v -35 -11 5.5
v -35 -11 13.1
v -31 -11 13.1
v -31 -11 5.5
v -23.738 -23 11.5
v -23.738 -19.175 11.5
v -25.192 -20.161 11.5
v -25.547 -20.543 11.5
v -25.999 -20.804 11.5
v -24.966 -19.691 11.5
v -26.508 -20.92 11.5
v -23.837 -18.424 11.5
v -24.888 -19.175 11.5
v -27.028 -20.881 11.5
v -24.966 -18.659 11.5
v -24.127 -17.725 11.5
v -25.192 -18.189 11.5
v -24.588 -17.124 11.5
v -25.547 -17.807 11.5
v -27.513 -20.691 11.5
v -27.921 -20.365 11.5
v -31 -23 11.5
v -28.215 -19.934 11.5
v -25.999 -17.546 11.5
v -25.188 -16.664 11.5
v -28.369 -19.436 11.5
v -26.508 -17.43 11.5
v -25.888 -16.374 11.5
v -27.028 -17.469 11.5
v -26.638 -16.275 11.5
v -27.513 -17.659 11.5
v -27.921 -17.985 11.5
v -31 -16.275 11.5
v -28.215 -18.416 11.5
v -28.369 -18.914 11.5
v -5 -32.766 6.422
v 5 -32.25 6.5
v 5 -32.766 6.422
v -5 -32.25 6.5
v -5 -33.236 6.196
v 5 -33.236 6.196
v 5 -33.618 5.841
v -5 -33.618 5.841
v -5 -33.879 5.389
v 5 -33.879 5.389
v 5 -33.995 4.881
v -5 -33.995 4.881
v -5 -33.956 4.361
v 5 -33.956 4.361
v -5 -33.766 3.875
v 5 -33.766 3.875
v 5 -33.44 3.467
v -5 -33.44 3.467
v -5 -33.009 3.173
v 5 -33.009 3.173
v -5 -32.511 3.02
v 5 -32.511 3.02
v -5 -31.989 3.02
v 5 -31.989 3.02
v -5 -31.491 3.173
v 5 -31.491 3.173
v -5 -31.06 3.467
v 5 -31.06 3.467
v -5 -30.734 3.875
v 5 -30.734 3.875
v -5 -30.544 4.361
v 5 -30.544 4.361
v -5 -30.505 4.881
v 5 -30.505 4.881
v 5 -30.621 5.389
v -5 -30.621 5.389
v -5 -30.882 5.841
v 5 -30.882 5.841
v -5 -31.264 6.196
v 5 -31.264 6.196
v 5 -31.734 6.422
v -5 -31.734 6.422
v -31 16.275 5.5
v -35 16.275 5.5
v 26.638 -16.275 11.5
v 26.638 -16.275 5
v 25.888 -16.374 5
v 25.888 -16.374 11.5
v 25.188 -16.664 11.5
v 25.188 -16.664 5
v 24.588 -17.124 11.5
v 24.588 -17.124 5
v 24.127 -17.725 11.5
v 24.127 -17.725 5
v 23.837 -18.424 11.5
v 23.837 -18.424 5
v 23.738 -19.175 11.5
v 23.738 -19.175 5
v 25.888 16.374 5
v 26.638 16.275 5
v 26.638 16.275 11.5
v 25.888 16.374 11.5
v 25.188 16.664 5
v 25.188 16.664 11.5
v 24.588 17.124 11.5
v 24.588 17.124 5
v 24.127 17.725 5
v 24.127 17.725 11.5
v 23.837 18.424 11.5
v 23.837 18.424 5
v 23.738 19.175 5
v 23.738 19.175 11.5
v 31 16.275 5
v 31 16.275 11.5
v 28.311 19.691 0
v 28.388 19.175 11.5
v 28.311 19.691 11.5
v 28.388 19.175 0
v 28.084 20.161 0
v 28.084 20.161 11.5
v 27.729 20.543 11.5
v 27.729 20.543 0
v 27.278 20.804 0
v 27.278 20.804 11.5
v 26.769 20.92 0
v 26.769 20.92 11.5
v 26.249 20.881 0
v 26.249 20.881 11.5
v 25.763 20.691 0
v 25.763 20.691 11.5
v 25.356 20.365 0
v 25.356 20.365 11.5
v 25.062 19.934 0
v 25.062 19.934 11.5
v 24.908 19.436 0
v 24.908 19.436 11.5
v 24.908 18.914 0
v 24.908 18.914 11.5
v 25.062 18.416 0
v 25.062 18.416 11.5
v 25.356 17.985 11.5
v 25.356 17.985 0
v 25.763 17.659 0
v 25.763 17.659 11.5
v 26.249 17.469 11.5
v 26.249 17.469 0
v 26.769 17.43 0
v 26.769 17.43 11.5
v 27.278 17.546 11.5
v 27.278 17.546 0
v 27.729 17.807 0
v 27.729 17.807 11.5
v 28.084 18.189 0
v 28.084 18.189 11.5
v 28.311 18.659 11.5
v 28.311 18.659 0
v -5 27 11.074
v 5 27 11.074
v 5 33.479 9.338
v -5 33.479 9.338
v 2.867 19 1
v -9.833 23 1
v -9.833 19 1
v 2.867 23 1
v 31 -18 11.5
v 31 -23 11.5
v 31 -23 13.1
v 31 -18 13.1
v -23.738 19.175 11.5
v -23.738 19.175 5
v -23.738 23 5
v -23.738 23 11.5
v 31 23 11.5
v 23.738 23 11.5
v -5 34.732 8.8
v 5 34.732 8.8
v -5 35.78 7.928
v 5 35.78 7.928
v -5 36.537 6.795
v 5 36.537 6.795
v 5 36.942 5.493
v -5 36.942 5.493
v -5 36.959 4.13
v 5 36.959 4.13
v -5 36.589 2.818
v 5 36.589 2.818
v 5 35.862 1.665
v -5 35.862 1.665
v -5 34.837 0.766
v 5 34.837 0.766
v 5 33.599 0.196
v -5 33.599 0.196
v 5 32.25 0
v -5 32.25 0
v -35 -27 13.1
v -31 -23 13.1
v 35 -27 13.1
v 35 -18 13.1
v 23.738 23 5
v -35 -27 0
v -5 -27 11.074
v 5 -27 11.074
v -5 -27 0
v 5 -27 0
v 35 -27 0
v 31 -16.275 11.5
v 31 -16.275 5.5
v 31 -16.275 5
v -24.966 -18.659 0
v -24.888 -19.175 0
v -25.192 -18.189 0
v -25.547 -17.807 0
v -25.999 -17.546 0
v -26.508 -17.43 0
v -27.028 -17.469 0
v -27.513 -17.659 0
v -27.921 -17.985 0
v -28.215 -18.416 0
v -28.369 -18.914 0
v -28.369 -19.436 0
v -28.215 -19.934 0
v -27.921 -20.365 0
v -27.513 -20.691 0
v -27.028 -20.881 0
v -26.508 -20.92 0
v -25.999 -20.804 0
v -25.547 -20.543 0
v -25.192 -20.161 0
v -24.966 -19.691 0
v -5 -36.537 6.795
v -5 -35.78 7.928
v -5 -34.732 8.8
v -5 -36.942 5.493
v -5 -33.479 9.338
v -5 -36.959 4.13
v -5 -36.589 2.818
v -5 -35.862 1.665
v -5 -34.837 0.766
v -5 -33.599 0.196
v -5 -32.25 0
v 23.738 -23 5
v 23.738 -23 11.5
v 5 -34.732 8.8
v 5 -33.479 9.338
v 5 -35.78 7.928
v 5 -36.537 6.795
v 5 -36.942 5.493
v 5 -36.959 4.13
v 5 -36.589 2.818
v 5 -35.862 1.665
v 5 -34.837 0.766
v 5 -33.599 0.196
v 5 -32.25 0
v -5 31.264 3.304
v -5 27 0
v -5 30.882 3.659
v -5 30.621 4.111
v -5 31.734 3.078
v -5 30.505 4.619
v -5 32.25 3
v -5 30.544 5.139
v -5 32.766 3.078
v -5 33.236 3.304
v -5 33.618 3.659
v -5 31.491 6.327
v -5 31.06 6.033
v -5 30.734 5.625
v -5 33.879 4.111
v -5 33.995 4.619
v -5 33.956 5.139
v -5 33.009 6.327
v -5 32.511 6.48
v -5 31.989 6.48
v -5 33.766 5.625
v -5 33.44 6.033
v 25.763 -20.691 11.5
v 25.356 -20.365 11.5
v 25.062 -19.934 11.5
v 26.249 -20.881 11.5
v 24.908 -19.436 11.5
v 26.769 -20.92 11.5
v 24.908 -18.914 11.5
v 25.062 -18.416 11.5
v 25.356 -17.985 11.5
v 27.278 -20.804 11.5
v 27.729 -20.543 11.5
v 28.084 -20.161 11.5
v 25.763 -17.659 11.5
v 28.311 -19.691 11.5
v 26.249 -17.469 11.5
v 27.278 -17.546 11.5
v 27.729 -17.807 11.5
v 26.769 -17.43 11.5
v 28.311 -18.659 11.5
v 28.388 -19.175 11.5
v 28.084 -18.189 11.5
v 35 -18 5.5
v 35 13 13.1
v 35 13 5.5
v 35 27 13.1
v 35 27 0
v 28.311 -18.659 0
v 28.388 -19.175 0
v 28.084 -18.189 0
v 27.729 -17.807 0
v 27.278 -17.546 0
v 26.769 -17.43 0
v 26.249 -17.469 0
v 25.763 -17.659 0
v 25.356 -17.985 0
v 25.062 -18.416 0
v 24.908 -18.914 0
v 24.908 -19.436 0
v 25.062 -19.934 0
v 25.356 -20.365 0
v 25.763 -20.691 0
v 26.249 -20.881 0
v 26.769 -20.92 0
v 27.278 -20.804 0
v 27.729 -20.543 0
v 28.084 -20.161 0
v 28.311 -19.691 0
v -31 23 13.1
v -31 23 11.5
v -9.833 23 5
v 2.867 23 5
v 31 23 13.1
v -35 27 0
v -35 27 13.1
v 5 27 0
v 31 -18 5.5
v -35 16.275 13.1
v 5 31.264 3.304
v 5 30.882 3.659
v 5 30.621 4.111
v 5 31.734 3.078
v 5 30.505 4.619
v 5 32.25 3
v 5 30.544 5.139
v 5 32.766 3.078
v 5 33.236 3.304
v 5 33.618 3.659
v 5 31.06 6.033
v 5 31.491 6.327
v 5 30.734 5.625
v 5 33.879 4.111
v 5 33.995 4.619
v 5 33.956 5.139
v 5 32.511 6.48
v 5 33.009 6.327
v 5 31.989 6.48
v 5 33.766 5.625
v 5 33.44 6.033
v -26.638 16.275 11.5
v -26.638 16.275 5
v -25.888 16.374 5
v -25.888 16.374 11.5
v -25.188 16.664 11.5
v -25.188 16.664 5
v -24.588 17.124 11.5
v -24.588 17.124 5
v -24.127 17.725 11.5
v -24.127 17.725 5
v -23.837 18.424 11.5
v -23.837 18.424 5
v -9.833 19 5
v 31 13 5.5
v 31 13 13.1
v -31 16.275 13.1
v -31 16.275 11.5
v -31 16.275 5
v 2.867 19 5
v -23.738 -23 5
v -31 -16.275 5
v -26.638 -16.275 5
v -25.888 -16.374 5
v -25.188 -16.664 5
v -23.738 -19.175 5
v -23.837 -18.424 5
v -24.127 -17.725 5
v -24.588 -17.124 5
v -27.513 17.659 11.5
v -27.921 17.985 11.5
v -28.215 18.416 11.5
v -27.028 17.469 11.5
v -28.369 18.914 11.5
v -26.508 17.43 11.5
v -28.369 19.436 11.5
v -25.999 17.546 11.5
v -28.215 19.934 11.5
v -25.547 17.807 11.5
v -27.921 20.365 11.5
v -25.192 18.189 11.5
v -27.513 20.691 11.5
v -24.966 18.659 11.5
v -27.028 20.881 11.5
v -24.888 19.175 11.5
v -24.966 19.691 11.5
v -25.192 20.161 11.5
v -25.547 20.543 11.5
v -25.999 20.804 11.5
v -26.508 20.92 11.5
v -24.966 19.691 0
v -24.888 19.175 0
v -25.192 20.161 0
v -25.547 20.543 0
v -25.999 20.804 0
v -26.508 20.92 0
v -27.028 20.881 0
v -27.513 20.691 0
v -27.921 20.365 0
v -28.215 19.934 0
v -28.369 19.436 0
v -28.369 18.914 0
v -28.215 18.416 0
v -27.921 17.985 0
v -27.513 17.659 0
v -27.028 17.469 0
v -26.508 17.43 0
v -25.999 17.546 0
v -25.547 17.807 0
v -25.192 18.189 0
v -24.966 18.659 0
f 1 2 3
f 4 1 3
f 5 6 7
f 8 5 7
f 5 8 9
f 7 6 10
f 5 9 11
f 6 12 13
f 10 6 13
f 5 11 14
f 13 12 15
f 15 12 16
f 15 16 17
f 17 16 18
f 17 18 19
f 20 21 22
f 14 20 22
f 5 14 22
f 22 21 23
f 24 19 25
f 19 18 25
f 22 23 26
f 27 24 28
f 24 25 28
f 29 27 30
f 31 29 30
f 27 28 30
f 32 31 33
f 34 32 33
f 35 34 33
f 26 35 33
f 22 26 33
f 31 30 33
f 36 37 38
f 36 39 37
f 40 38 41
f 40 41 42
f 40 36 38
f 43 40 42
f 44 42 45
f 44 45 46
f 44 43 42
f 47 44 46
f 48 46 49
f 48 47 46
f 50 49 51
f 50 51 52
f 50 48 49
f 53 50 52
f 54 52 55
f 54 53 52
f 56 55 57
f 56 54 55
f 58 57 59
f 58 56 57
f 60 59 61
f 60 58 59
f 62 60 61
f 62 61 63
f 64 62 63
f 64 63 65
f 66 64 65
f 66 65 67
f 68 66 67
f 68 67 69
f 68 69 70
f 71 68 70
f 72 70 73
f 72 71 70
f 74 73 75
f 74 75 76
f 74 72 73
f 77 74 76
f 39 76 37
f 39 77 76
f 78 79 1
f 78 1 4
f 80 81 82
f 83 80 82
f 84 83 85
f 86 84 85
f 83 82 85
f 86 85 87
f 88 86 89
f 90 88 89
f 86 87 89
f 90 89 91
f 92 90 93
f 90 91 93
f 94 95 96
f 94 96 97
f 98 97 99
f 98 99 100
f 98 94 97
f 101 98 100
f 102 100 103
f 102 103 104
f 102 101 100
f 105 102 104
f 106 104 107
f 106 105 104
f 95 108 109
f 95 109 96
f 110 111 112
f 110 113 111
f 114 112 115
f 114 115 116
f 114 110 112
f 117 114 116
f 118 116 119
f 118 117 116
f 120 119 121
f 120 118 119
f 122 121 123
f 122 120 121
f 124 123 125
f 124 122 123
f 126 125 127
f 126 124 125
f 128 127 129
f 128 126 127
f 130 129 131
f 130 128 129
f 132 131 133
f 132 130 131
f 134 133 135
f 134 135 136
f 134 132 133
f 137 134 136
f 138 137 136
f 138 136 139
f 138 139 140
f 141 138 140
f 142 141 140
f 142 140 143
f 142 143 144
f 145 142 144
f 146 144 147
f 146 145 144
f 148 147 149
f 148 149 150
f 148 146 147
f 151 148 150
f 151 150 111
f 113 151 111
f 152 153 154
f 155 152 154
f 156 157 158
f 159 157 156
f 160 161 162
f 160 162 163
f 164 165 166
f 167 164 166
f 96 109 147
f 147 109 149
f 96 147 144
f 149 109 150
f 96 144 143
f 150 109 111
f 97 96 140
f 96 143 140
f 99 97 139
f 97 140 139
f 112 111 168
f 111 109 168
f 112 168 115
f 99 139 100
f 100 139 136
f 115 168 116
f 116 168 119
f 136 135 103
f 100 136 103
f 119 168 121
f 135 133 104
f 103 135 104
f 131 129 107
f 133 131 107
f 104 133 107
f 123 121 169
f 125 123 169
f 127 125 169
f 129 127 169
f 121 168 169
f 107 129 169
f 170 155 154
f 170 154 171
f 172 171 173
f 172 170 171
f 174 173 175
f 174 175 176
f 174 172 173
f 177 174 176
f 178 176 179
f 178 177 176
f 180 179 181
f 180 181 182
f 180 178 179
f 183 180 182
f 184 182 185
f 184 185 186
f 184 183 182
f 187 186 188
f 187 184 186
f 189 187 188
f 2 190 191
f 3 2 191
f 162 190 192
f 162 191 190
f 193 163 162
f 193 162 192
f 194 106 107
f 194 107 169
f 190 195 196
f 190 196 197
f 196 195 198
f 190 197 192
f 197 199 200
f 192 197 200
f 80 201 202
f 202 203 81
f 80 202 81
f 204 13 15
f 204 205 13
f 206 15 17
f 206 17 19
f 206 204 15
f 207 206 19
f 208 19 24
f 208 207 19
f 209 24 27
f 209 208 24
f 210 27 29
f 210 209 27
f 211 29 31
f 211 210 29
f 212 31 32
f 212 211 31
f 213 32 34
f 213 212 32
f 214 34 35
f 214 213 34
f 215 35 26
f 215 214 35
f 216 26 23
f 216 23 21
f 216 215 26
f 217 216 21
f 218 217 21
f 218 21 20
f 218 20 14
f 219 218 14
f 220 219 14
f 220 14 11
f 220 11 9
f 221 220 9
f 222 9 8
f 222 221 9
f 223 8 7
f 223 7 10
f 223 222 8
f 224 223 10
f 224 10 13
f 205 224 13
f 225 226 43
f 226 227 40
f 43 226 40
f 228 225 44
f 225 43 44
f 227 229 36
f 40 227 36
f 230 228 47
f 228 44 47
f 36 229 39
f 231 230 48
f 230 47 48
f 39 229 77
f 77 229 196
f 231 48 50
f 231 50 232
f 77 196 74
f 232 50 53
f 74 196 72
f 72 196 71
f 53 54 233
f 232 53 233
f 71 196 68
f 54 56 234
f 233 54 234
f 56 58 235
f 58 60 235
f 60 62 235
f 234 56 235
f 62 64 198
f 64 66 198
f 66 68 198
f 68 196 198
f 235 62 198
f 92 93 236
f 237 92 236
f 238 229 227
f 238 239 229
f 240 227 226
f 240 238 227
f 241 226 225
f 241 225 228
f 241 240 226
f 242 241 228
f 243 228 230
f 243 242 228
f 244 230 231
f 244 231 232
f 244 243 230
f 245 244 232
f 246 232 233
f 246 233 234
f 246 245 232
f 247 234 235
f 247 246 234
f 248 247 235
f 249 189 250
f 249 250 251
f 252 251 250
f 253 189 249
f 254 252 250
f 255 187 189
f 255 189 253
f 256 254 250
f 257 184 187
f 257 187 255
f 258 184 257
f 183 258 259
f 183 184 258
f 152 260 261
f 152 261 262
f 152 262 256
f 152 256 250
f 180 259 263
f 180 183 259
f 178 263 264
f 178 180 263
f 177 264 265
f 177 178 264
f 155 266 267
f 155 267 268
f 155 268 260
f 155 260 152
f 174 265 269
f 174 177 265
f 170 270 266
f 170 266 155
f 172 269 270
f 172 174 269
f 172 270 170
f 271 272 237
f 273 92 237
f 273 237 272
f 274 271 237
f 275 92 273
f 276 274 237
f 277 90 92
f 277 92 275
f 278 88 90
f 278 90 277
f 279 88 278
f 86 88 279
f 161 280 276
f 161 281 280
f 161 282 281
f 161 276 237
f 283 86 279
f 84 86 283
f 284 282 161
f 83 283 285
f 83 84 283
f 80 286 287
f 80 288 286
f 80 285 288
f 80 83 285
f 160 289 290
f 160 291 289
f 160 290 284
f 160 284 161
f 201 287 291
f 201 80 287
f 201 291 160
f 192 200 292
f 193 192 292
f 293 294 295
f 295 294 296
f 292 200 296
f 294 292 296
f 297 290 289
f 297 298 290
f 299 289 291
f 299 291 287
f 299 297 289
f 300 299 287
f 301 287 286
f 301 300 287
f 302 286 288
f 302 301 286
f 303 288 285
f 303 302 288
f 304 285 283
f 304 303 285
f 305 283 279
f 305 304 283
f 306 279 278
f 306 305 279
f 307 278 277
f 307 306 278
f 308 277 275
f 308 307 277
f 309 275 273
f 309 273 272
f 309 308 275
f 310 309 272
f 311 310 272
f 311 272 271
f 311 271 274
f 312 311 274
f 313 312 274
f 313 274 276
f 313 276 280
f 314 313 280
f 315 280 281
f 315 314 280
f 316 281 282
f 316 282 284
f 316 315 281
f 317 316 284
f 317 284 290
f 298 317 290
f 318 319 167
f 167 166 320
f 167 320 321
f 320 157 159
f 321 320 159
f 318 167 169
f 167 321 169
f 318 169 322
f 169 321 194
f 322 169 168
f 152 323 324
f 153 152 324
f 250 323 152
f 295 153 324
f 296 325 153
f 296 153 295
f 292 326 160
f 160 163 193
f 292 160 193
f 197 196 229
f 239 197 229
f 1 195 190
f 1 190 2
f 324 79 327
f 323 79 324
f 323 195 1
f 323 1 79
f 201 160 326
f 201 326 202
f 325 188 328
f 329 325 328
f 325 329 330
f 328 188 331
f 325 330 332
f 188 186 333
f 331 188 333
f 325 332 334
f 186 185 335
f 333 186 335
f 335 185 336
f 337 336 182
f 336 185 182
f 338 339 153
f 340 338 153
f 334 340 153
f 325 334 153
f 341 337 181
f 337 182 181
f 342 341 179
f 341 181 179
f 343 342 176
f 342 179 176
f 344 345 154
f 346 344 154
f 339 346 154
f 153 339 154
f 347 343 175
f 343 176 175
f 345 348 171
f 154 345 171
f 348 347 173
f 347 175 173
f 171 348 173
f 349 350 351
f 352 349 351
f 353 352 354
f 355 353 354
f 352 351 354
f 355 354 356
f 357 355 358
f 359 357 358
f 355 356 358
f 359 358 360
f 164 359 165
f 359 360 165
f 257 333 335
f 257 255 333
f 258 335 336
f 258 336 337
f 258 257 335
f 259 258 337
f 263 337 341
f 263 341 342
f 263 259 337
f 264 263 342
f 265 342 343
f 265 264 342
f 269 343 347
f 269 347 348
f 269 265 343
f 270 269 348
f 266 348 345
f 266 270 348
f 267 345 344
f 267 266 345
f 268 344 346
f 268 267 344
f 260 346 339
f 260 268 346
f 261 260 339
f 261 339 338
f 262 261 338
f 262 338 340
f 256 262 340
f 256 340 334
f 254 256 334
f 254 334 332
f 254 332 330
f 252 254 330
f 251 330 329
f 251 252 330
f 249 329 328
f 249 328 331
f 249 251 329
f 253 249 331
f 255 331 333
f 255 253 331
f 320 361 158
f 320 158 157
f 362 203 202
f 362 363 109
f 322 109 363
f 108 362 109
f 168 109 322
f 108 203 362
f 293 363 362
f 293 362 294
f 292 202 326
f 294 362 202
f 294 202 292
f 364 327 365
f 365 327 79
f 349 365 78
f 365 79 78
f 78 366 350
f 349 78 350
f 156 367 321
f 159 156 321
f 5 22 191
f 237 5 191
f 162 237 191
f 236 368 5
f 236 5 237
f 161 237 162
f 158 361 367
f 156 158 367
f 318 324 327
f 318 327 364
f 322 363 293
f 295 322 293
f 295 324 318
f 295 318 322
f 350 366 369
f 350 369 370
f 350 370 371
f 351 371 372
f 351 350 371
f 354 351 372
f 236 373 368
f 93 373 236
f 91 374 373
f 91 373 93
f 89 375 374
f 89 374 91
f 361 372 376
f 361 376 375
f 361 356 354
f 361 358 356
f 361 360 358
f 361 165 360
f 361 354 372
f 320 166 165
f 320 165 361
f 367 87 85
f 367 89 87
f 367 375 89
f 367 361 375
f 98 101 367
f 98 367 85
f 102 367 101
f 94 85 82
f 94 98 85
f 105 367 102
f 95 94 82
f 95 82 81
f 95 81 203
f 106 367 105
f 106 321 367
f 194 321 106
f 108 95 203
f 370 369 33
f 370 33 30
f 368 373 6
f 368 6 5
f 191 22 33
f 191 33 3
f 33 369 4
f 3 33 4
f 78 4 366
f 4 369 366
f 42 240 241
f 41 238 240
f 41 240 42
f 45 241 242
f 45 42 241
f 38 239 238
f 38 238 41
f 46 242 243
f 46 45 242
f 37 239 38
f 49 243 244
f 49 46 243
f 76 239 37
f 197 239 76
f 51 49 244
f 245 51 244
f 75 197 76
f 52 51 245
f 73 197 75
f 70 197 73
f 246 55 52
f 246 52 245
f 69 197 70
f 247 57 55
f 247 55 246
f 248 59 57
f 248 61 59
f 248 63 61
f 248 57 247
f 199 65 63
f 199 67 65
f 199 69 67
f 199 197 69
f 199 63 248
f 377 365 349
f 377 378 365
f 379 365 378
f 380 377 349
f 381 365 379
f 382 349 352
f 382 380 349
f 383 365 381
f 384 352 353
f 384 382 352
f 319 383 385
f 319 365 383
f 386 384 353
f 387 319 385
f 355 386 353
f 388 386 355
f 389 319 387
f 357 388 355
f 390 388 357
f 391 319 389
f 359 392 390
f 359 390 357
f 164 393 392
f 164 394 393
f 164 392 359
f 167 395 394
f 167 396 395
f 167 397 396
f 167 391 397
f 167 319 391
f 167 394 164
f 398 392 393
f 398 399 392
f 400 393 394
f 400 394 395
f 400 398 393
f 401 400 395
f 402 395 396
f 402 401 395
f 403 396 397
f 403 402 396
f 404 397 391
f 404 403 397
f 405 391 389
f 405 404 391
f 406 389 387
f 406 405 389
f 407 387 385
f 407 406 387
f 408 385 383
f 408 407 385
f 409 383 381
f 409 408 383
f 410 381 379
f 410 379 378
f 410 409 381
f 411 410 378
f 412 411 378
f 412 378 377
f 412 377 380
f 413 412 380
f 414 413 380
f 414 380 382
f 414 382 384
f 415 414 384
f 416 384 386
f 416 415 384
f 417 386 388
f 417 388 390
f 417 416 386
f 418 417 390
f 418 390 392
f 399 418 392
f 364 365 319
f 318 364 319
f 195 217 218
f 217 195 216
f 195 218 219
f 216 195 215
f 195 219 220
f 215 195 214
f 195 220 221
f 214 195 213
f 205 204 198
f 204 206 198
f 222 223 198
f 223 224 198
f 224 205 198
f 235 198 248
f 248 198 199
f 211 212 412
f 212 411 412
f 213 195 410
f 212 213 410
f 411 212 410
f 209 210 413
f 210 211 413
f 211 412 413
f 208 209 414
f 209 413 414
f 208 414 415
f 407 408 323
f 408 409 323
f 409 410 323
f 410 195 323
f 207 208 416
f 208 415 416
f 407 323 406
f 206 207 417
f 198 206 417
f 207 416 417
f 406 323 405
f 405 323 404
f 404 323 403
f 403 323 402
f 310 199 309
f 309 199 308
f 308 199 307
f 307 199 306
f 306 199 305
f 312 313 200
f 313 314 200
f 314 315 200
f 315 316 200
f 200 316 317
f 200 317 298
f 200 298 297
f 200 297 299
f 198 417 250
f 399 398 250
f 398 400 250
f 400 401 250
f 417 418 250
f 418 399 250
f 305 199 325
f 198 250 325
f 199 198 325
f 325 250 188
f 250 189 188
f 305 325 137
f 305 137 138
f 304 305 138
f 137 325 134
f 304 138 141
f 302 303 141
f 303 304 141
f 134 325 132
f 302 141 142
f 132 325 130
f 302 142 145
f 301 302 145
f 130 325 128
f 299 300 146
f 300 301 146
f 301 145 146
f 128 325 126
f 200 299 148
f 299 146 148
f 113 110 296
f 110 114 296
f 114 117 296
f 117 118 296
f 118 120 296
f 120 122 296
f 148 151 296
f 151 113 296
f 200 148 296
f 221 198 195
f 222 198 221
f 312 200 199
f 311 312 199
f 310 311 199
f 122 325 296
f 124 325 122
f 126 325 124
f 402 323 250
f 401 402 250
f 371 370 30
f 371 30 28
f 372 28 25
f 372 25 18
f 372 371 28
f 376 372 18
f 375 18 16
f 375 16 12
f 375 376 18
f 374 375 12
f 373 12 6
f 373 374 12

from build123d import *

# Parameters (mm, degrees)
SKETCH1_W           = 62
SKETCH1_H           = 46
SKETCH1_R           = 1.75
BOSS_EXTRUDE1_DEPTH = 5
SKETCH1_3_W         = 70
SKETCH1_3_H         = 54
SKETCH1_3_W_2       = 62
SKETCH1_3_H_2       = 46
BOSS_EXTRUDE2_DEPTH = 13.1
SKETCH2_W           = 12.7
SKETCH2_H           = 4
CUT_EXTRUDE1_DEPTH  = 4
SKETCH3_R           = 1.75
BOSS_EXTRUDE3_DEPTH = 6.5
SKETCH4_W           = 4
SKETCH4_H           = 27.275016295
SKETCH4_H_2         = 31
CUT_EXTRUDE2_DEPTH  = 7.6
SKETCH5_R           = 1.75
BOSS_EXTRUDE4_DEPTH = 5


with BuildPart() as part:
    # Sketch1 → Boss-Extrude1 (new body)
    with BuildSketch(Plane.XY):
        Rectangle(SKETCH1_W, SKETCH1_H)
        with Locations((26.638347595, -19.175016295)):
            Circle(SKETCH1_R, mode=Mode.SUBTRACT)
        with Locations((26.638347595, 19.175016295)):
            Circle(SKETCH1_R, mode=Mode.SUBTRACT)
        with Locations((-26.638347595, 19.175016295)):
            Circle(SKETCH1_R, mode=Mode.SUBTRACT)
        with Locations((-26.638347595, -19.175016295)):
            Circle(SKETCH1_R, mode=Mode.SUBTRACT)
    extrude(amount=BOSS_EXTRUDE1_DEPTH)

    # Sketch1<3> → Boss-Extrude2 (add)
    with BuildSketch(Plane.XY):
        Rectangle(SKETCH1_3_W, SKETCH1_3_H)
        Rectangle(SKETCH1_3_W_2, SKETCH1_3_H_2, mode=Mode.SUBTRACT)
    extrude(amount=BOSS_EXTRUDE2_DEPTH)

    # Sketch2 → Cut-Extrude1 (cut)
    with BuildSketch(Plane.XY.offset(5)):
        with Locations((-3.48328221, 21)):
            Rectangle(SKETCH2_W, SKETCH2_H)
    extrude(amount=-CUT_EXTRUDE1_DEPTH, mode=Mode.SUBTRACT)

    # Sketch3 → Boss-Extrude3 (add)
    # profile 1 of 4: a face of its own
    with BuildSketch(Plane.XY.offset(5)):
        with BuildLine():
            Line((-23.738347595, 19.175016295), (-23.738347595, 23))
            Line((-23.738347595, 23), (-31, 23))
            Line((-31, 23), (-31, 16.275016295))
            Line((-31, 16.275016295), (-26.638347595, 16.275016295))
            ThreePointArc((-26.638347595, 16.275016295), (-24.58773793, 17.12440663), (-23.738347595, 19.175016295))
        make_face()
        with Locations((-26.638347595, 19.175016295)):
            Circle(SKETCH3_R, mode=Mode.SUBTRACT)
    # profile 2 of 4: a face of its own
    with BuildSketch(Plane.XY.offset(5)):
        with BuildLine():
            Line((-31, -16.275016295), (-26.638347595, -16.275016295))
            ThreePointArc((-26.638347595, -16.275016295), (-24.58773793, -17.12440663), (-23.738347595, -19.175016295))
            Line((-23.738347595, -19.175016295), (-23.738347595, -23))
            Line((-23.738347595, -23), (-31, -23))
            Line((-31, -23), (-31, -16.275016295))
        make_face()
        with Locations((-26.638347595, -19.175016295)):
            Circle(SKETCH3_R, mode=Mode.SUBTRACT)
    # profile 3 of 4: a face of its own
    with BuildSketch(Plane.XY.offset(5)):
        with BuildLine():
            Line((31, -23), (31, -16.275016295))
            Line((31, -16.275016295), (26.638347595, -16.275016295))
            ThreePointArc((26.638347595, -16.275016295), (24.58773793, -17.12440663), (23.738347595, -19.175016295))
            Line((23.738347595, -19.175016295), (23.738347595, -23))
            Line((23.738347595, -23), (31, -23))
        make_face()
        with Locations((26.638347595, -19.175016295)):
            Circle(SKETCH3_R, mode=Mode.SUBTRACT)
    # profile 4 of 4: a face of its own
    with BuildSketch(Plane.XY.offset(5)):
        with BuildLine():
            Line((31, 16.275016295), (26.638347595, 16.275016295))
            ThreePointArc((26.638347595, 16.275016295), (24.58773793, 17.12440663), (23.738347595, 19.175016295))
            Line((23.738347595, 19.175016295), (23.738347595, 23))
            Line((23.738347595, 23), (31, 23))
            Line((31, 23), (31, 16.275016295))
        make_face()
        with Locations((26.638347595, 19.175016295)):
            Circle(SKETCH3_R, mode=Mode.SUBTRACT)
    extrude(amount=BOSS_EXTRUDE3_DEPTH)

    # Sketch4 → Cut-Extrude2 (cut)
    with BuildSketch(Plane.XY.offset(13.1)):
        with Locations((-33, 2.637508148)):
            Rectangle(SKETCH4_W, SKETCH4_H)
        with Locations((33, -2.5)):
            Rectangle(SKETCH4_W, SKETCH4_H_2)
    extrude(amount=-CUT_EXTRUDE2_DEPTH, mode=Mode.SUBTRACT)

    # Sketch5 → Boss-Extrude4 (add, symmetric)
    # profile 1 of 2: a face of its own
    with BuildSketch(Plane(origin=(0, 0, 0), x_dir=(0, 0, -1), z_dir=(1, 0, 0))):
        with BuildLine():
            Line((-11.074295117, 27), (-9.338147675, 33.479390464))
            ThreePointArc((-9.338147675, 33.479390464), (-4.130000587, 36.959363092), (0, 32.25))
            Line((0, 32.25), (0, 27))
            Line((0, 27), (-11.074295117, 27))
        make_face()
        with Locations((-4.75, 32.25)):
            Circle(SKETCH5_R, mode=Mode.SUBTRACT)
    # profile 2 of 2: a face of its own
    with BuildSketch(Plane(origin=(0, 0, 0), x_dir=(0, 0, -1), z_dir=(1, 0, 0))):
        with BuildLine():
            Line((0, -32.25), (0, -27))
            Line((0, -27), (-11.074295117, -27))
            Line((-11.074295117, -27), (-9.338147675, -33.479390464))
            ThreePointArc((-9.338147675, -33.479390464), (-4.130000587, -36.959363092), (0, -32.25))
        make_face()
        with Locations(Location((-4.75, -32.25, 0), (0, 0, 180))):
            Circle(SKETCH5_R, mode=Mode.SUBTRACT)
    extrude(amount=BOSS_EXTRUDE4_DEPTH, both=True)


solid = part.part
